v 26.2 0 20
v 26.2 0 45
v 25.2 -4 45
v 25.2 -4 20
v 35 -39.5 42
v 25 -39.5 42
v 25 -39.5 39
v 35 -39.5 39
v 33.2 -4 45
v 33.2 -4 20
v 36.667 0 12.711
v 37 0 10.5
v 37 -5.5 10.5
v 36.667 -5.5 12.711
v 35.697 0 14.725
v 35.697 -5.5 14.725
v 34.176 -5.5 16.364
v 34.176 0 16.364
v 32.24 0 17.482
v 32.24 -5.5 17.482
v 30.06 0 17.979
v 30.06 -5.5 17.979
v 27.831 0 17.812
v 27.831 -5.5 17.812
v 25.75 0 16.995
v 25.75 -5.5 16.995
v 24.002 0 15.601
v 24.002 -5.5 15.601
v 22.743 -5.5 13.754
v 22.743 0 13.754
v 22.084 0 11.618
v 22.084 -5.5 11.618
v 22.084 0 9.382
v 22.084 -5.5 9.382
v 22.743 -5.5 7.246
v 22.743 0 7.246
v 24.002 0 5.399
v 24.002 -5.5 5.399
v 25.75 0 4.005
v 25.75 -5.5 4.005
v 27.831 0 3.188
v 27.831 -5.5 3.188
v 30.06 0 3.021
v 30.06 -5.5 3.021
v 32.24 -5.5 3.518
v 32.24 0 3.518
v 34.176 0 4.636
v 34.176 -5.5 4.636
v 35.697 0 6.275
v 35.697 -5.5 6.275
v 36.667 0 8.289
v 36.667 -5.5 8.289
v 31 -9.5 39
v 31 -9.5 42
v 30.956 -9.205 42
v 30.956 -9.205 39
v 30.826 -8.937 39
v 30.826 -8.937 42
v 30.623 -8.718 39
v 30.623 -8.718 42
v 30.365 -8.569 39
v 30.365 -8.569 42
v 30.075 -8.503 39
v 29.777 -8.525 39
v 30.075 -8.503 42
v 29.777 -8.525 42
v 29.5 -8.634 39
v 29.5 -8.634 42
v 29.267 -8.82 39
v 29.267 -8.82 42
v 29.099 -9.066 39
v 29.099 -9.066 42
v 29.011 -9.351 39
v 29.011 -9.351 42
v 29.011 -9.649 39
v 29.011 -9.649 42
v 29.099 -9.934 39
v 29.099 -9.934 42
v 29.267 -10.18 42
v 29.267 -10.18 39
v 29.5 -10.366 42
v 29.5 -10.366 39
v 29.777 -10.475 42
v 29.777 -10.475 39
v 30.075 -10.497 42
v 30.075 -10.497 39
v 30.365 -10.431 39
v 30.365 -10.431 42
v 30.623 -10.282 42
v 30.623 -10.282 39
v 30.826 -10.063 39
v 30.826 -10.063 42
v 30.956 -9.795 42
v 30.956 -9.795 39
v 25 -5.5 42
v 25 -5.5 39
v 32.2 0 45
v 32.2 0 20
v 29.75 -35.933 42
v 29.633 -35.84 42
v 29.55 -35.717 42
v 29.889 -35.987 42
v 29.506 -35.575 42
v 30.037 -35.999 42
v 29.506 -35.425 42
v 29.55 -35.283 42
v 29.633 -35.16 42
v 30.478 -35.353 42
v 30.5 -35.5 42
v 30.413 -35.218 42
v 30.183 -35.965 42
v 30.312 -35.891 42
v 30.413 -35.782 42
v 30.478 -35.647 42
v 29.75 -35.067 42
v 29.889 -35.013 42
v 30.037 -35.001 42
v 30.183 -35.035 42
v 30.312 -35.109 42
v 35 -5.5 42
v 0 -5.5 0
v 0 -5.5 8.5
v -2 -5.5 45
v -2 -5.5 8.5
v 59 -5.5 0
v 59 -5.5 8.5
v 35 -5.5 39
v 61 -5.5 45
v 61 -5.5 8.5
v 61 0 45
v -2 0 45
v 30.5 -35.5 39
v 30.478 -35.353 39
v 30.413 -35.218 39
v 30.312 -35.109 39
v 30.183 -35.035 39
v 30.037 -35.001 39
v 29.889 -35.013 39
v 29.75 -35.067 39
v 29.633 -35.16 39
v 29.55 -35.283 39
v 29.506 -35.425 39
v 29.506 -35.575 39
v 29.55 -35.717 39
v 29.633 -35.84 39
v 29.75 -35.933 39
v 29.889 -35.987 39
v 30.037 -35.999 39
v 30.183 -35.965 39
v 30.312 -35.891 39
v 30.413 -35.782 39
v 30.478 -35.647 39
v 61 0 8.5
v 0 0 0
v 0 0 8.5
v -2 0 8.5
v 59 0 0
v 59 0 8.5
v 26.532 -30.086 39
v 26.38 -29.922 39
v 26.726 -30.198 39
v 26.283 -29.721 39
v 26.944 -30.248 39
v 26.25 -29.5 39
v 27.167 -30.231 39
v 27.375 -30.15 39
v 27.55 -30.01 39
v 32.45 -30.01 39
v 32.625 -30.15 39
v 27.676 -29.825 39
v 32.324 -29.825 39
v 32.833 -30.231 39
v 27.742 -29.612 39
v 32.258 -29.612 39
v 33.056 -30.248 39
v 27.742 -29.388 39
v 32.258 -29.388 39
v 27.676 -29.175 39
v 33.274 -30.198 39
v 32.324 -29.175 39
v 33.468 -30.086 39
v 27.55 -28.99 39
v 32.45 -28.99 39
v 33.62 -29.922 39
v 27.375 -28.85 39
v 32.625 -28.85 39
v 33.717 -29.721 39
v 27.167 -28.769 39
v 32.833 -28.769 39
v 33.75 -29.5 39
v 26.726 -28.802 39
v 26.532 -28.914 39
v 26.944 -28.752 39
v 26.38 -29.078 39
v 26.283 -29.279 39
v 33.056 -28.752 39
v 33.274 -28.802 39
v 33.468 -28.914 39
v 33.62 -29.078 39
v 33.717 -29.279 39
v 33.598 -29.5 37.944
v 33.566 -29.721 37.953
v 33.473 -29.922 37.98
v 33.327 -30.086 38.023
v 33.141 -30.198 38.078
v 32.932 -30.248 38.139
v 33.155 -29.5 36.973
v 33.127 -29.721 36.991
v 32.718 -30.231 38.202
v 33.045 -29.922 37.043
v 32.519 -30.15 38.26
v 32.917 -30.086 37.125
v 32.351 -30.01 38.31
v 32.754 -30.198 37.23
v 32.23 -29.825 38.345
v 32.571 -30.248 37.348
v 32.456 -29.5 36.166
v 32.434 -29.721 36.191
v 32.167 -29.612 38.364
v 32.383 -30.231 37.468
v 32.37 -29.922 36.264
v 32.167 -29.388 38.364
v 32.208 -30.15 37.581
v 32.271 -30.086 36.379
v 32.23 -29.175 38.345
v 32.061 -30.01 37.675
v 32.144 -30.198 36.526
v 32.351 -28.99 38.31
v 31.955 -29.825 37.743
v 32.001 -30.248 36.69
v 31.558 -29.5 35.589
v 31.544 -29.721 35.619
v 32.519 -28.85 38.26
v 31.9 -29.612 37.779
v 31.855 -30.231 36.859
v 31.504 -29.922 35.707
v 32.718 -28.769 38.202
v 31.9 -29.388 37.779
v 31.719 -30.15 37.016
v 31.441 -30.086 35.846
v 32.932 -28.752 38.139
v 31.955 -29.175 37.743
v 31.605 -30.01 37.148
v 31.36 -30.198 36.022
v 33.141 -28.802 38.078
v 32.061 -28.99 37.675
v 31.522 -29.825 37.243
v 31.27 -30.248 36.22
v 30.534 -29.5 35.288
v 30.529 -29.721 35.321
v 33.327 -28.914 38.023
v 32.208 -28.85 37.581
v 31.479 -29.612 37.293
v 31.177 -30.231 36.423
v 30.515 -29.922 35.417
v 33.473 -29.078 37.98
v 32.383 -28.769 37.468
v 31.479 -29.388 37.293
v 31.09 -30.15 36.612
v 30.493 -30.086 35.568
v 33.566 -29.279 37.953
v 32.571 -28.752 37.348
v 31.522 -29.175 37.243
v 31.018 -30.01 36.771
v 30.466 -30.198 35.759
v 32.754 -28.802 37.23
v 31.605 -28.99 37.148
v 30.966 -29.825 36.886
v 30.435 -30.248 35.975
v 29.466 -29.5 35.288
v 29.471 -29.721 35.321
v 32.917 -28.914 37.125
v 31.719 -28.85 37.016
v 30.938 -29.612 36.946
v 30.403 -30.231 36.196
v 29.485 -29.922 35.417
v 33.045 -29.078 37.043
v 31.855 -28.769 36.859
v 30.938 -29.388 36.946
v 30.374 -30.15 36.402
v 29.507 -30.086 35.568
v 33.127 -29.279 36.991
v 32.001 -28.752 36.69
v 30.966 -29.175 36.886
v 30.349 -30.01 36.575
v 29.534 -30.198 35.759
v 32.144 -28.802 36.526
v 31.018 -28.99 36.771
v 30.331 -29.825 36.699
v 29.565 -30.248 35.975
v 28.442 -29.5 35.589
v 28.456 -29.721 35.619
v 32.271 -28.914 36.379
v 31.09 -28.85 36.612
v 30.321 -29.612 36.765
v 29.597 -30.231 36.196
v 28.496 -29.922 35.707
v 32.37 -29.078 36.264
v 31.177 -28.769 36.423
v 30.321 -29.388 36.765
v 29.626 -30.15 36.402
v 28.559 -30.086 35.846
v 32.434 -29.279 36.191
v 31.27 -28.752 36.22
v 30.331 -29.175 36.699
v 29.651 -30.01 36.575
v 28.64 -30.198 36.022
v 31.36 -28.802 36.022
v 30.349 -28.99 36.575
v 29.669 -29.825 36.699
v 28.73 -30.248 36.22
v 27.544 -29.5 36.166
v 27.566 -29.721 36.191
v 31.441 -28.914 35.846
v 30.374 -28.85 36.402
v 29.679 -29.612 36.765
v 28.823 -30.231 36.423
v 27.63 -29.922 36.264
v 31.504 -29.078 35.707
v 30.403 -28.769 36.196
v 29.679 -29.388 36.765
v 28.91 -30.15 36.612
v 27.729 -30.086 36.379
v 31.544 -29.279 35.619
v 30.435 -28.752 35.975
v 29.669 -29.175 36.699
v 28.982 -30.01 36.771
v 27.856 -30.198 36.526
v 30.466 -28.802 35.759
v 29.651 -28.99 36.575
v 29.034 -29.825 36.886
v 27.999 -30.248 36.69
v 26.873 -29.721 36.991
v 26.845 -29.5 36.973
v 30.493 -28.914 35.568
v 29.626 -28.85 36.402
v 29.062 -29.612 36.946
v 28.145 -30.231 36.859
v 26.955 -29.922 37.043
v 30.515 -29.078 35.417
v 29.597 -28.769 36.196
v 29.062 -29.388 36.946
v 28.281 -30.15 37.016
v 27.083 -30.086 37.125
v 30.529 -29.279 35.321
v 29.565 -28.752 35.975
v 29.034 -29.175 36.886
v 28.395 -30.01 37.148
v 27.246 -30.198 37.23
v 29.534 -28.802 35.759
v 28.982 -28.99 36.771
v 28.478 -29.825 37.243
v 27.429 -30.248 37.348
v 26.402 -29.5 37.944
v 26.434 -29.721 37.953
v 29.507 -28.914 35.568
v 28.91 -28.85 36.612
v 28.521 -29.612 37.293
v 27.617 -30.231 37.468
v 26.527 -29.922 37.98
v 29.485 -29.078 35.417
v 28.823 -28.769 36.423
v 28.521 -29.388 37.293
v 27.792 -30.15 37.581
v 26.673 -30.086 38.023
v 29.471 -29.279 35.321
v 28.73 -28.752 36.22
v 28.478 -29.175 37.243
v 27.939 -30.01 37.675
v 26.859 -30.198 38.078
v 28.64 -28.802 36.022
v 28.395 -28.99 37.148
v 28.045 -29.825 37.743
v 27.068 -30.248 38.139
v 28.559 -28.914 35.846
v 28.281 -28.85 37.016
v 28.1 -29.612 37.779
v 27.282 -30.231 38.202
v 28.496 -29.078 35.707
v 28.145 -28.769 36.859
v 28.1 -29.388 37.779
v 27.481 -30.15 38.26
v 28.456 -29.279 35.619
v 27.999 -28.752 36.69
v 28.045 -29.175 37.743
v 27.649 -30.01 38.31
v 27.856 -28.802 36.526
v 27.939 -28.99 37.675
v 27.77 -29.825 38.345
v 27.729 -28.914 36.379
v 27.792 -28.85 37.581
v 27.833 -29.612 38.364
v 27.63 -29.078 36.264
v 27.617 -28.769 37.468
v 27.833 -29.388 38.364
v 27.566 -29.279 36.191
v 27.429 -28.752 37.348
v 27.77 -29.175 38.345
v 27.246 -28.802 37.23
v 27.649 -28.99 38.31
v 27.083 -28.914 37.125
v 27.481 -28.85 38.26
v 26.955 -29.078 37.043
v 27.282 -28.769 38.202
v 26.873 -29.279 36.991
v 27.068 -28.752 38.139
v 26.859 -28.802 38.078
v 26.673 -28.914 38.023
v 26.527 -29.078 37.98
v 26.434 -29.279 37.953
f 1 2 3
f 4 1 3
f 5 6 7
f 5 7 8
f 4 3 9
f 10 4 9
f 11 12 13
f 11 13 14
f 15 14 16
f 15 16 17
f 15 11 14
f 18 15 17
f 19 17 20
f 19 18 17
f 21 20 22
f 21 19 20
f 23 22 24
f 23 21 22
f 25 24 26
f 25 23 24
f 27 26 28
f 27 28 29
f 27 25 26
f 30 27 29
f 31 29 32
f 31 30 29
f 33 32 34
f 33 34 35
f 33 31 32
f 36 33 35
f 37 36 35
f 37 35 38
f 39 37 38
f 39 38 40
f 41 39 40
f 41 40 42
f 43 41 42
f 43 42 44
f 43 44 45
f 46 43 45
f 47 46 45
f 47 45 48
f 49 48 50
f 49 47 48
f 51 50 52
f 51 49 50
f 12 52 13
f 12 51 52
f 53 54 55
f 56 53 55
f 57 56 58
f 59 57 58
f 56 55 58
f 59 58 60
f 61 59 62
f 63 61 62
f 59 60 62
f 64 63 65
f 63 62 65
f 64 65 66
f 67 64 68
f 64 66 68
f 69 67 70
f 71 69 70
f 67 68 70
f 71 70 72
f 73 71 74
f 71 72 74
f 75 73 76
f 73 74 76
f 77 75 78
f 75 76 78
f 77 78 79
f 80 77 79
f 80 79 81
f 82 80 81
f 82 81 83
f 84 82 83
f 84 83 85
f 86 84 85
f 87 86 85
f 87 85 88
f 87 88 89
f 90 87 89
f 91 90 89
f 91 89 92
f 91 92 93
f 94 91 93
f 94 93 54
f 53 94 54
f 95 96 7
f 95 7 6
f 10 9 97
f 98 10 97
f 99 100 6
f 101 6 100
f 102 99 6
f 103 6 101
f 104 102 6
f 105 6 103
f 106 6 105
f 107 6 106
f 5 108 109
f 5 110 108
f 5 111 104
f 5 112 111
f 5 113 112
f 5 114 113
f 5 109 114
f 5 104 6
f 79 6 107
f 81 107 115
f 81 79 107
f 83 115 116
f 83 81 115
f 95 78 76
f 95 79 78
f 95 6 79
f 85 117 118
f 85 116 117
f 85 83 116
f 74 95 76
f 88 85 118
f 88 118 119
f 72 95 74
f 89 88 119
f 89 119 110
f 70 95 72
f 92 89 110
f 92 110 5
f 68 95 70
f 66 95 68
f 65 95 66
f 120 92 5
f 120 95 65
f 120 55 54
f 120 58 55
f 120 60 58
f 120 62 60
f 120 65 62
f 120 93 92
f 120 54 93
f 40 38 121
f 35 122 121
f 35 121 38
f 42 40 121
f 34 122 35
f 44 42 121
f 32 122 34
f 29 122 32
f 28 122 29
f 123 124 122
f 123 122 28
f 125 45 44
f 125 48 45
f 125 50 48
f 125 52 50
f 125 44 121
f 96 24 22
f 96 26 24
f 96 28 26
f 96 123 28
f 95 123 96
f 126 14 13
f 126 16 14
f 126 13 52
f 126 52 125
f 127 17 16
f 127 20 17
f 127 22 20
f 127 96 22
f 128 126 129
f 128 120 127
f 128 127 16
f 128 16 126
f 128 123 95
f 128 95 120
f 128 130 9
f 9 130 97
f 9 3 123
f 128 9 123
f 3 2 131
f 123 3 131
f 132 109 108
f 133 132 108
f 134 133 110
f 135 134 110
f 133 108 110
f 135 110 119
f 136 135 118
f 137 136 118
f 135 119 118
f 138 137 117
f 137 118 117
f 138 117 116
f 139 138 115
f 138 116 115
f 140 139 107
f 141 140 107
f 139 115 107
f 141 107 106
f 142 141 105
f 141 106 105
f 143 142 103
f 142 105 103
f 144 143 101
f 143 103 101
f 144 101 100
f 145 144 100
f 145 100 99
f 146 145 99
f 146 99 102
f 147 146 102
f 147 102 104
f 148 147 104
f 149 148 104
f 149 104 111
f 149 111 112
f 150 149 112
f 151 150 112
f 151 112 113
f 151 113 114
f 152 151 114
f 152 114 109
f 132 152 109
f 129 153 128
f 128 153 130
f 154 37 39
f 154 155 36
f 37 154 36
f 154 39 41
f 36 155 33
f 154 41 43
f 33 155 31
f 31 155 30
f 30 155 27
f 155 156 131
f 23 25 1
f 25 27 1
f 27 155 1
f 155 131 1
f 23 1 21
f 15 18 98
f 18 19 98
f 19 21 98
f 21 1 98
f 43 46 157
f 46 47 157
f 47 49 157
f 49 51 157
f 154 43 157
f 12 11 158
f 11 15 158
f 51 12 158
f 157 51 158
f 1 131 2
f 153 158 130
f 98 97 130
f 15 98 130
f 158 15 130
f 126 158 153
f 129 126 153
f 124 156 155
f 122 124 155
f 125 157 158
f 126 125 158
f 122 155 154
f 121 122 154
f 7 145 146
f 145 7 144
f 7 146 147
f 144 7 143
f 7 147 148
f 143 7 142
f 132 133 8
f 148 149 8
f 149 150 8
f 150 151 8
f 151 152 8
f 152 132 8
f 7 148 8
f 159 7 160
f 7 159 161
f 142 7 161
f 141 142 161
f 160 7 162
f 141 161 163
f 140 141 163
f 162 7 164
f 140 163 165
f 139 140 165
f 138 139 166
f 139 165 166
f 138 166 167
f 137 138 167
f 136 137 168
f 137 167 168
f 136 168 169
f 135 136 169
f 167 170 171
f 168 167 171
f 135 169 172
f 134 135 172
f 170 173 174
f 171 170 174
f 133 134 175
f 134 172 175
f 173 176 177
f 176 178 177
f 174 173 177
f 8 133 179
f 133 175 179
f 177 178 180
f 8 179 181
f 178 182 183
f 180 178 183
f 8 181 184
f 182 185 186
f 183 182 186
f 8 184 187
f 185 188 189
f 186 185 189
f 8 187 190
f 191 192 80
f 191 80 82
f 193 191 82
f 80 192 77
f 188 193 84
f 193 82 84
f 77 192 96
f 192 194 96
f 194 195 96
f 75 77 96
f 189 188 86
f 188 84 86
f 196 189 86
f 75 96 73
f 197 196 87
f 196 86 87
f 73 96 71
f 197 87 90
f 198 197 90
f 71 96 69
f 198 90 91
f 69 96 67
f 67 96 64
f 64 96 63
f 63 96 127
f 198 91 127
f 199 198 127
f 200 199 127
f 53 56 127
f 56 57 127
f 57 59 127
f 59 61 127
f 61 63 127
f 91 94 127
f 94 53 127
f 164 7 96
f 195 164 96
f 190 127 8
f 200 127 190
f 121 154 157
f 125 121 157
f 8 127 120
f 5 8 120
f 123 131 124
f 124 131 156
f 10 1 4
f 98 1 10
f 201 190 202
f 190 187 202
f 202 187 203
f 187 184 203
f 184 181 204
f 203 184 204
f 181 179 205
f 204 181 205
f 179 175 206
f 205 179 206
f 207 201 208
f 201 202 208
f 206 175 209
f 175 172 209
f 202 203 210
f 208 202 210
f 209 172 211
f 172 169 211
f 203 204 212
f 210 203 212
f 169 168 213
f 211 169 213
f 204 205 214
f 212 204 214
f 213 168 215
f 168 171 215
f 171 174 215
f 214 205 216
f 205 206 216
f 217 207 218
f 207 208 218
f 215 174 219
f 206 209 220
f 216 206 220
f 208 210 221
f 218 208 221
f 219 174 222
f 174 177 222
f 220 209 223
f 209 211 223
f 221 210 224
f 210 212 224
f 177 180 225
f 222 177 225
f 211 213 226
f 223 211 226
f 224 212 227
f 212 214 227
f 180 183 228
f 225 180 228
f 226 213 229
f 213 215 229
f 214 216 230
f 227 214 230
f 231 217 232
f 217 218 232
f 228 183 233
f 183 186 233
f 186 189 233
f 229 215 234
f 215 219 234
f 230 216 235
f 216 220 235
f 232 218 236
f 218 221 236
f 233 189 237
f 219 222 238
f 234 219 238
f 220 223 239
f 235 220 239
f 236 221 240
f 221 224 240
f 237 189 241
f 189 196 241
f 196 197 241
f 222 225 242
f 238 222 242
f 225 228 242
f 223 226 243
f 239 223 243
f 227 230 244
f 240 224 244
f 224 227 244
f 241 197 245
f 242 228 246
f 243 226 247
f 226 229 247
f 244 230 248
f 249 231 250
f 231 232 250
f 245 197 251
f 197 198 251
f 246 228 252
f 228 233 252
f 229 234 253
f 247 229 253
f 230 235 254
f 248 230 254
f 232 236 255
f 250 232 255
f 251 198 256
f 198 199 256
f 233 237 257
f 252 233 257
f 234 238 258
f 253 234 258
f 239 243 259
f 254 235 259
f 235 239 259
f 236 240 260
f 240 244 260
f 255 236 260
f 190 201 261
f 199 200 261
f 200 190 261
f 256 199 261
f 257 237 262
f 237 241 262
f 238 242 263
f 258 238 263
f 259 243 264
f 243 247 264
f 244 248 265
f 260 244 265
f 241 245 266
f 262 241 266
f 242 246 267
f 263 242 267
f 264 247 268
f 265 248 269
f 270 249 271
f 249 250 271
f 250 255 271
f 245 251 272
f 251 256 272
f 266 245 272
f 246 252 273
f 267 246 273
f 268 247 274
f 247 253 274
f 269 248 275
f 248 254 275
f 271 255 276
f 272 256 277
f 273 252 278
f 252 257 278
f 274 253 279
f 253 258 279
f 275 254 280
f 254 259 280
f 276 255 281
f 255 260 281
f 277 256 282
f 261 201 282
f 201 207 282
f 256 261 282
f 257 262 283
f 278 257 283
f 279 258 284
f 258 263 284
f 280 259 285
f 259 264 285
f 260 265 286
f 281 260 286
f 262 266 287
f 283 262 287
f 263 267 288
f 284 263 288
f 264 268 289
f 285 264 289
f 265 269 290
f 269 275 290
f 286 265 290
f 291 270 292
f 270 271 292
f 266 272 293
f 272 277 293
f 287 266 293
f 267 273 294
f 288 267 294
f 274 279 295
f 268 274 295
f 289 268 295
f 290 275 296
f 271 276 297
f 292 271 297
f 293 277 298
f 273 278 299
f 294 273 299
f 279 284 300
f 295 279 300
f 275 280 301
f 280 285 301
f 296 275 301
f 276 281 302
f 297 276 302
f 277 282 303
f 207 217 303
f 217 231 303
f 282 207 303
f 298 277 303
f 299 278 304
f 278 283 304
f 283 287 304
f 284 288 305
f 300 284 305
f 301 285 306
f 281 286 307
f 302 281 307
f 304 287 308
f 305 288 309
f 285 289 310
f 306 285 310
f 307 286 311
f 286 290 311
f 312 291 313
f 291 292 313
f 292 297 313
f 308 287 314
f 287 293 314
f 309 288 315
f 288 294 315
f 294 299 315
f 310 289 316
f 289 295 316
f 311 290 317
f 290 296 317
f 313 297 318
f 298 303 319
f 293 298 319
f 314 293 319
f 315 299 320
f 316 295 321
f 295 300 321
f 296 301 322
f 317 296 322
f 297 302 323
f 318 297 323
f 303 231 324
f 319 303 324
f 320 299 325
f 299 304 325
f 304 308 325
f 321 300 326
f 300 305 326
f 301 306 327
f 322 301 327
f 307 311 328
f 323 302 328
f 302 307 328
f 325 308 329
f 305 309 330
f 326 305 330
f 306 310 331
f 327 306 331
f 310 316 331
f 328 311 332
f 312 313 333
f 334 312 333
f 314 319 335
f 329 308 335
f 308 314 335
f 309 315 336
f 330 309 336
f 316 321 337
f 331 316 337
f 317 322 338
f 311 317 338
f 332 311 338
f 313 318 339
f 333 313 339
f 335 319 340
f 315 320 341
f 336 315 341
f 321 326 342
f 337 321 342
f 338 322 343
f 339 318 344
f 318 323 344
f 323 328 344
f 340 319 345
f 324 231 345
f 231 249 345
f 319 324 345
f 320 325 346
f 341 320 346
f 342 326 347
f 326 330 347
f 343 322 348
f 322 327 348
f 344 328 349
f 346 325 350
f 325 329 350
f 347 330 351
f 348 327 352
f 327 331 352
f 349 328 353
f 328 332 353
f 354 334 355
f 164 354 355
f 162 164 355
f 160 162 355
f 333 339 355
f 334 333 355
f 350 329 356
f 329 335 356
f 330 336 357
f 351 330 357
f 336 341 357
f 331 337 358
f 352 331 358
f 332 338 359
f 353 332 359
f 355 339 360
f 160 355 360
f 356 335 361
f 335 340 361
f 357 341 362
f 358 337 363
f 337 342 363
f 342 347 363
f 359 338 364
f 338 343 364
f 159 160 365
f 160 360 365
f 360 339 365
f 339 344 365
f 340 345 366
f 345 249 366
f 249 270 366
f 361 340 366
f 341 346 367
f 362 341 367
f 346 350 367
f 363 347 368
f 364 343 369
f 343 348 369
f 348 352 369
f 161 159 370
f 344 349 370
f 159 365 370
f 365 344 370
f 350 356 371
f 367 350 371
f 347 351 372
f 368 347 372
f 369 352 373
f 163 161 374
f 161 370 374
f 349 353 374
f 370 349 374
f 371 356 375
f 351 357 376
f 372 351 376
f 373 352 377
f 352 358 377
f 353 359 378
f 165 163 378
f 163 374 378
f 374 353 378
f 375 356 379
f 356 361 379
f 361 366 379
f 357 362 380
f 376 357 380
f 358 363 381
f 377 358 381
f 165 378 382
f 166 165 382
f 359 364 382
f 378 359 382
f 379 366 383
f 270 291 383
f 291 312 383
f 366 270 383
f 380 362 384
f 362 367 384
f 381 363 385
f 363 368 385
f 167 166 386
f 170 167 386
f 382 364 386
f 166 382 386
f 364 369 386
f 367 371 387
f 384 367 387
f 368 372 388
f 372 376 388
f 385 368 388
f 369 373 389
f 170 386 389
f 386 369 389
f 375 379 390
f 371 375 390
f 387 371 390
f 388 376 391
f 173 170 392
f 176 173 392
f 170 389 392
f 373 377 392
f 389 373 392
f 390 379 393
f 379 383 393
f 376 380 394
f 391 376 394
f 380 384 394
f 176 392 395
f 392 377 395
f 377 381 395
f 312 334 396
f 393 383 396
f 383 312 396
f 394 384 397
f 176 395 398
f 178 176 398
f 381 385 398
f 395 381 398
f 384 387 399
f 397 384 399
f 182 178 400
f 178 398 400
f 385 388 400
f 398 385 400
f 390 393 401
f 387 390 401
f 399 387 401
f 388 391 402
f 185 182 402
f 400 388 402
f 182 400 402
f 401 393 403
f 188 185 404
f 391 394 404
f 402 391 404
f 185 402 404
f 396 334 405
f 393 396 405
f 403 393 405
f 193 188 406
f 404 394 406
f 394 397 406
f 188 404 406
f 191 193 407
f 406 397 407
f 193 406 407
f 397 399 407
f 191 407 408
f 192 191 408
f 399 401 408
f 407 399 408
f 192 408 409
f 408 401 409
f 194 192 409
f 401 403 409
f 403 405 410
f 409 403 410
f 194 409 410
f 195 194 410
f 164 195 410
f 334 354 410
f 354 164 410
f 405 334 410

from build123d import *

# Parameters (mm, degrees)
F0_R      = 7.5
F1_DEPTH  = 5.5
F3_DEPTH  = 25
F4_W      = 10
F4_H      = 3
F5_DEPTH  = 34
F6_R      = 0.5
F7_DEPTH  = 6
F6_R_2    = 1
F8_DEPTH  = 25
F9_R      = 0.75
F10_ANGLE = 180


# Not quite as in the source:
# - a feature names something its author has since deleted; it is built from what else it names


with BuildPart() as f1:
    # F0 (on Front) → F1 (new body)
    with BuildSketch(Plane.XZ):
        Polygon((0, 8.5), (0, 0), (59, 0), (59, 8.5), (61, 8.5), (61, 45), (-2, 45), (-2, 8.5), align=None)
        with Locations((29.5, 10.5)):
            Circle(F0_R, mode=Mode.SUBTRACT)
    extrude(amount=F1_DEPTH)

    # F2 (on face) → F3 (cut)
    with BuildSketch(Plane.XY.offset(45)):
        Polygon((26.2, 0), (25.2, -4), (33.2, -4), (32.2, 0), align=None)
    extrude(amount=-F3_DEPTH, mode=Mode.SUBTRACT)

    # F4 (on face) → F5 (join)
    with BuildSketch(Plane.XZ.offset(5.5)):
        with Locations((30, 40.5)):
            Rectangle(F4_W, F4_H)
    extrude(amount=F5_DEPTH)

    # F6 (on face) → F7 (cut)
    with BuildSketch(Plane.XY.offset(42)):
        with Locations((30, -35.5)):
            Circle(F6_R)
    extrude(amount=-F7_DEPTH, mode=Mode.SUBTRACT)

    # F6 (on face) → F8 (cut)
    with BuildSketch(Plane.XY.offset(42)):
        with Locations((30, -9.5)):
            Circle(F6_R_2)
    extrude(amount=-F8_DEPTH, mode=Mode.SUBTRACT)

    # F9 (on face) → F10 (revolve)
    with BuildSketch(Plane(origin=(0, 0, 39), x_dir=(1, 0, 0), z_dir=(0, 0, -1))):
        with Locations((33, 29.5)):
            Circle(F9_R)
    revolve(axis=Axis((30, -12.9445128906, 39), (0, 1, 0)), revolution_arc=F10_ANGLE)


solid = f1.part
